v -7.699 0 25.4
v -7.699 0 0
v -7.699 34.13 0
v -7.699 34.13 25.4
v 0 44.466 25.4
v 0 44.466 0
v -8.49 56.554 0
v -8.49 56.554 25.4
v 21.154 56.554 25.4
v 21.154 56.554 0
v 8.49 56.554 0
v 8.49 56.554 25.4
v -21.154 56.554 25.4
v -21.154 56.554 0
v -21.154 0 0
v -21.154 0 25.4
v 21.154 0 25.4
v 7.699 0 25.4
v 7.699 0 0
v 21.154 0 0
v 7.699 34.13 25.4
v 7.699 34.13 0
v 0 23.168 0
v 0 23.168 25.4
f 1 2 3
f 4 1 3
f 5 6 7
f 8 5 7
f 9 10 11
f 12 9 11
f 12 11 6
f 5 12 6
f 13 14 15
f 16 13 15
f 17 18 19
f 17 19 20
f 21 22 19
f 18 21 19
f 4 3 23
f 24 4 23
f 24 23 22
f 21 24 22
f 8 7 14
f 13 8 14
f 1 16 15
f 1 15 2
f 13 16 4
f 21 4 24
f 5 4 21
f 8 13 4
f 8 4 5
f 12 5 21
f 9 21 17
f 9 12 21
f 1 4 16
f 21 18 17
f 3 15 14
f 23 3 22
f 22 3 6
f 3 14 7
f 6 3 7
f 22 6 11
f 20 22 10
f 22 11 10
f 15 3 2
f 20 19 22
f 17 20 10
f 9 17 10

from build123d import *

# Parameters (mm, degrees)
F0_W          = 29.8302113987
F0_H          = 9.2097856104
F1_DEPTH      = 25.4
F2_T1_DEPTH   = 25.4
F2_T3_DEPTH   = 15.24
F2_T5_DEPTH   = 56.4671399768
F2_T7_DEPTH   = 44.9504289544
F2_T9_DEPTH   = 56.4670330548
F2_T11_DEPTH  = 20.32
F2_T13_DEPTH  = 20.3101045111
F2_T15_DEPTH  = 50.8
F2_T20_DEPTH  = 5.08
F2_T26_DEPTH  = 5.08
F2_T32_DEPTH  = 5.08
F2_T38_DEPTH  = 5.08
F2_S43_W      = 5.08
F2_S43_H      = 5.08
F2_T44_DEPTH  = 5.08
F2_S49_W      = 5.08
F2_S49_H      = 5.08
F2_T50_DEPTH  = 5.08
F2_S55_W      = 5.08
F2_S55_H      = 5.08
F2_T56_DEPTH  = 5.08
F2_S61_W      = 5.08
F2_S61_H      = 5.08
F2_T62_DEPTH  = 5.08
F2_T65_DEPTH  = 11.1376243347
F2_T67_DEPTH  = 11.5693333262
F2_T69_DEPTH  = 19.6702113987
F2_S73_W      = 5.08
F2_S73_H      = 5.08
F2_T74_DEPTH  = 5.08
F2_S79_W      = 5.08
F2_S79_H      = 5.08
F2_T80_DEPTH  = 5.08
F2_S85_W      = 5.08
F2_S85_H      = 5.08
F2_T86_DEPTH  = 5.08
F2_S91_W      = 5.08
F2_S91_H      = 5.08
F2_T92_DEPTH  = 5.08
F2_T96_ANGLE  = 90
F2_T98_ANGLE  = 90
F2_T100_ANGLE = 90
F2_T102_ANGLE = 90
F2_T104_ANGLE = 90
F2_T106_ANGLE = 90
F2_T108_ANGLE = 90
F2_T110_ANGLE = 90
F2_T112_ANGLE = 90
F2_T114_ANGLE = 90
F2_T116_ANGLE = 90
F2_T118_ANGLE = 90
F3_DEPTH      = 25.4
F6_DEPTH      = 25.4


# Not quite as in the source:
# - a fillet or chamfer that OpenCascade refuses, or shapes differently, is made with other operations: its cross-section is extruded or revolved along the edge and cut away or added


with BuildPart() as f1:
    # F0 (on Top) → F1 (new body)
    with BuildSketch(Plane.XY):
        Polygon((-27.6151056993, 52.1290511863), (-27.6151056993, 0), (-14.9151056993, 0), (-14.9151056993, 21.7293333262), (-14.9151056993, 30.9391189367), (-14.9151056993, 52.2367432714), (14.9151056993, 52.2367432714), (14.9151056993, 30.9391189367), (14.9151056993, 21.7293333262), (14.9151056993, 0), (27.6151056993, 0), (27.4854470044, 66.6270330548), (-27.6151056993, 66.6270330548), align=None)
        with Locations((0, 26.3342261314)):
            Rectangle(F0_W, F0_H)
    extrude(amount=F1_DEPTH)

    # F2: fillet of radius 5.08 on 36 edges, made by hand

    # F2_s2 → F2_t1 (join)
    with BuildSketch(Plane.XY):
        with BuildLine():
            ThreePointArc((-14.9151056993, 36.0191189367), (-13.4272081478, 32.4270164882), (-9.8351056993, 30.9391189367))
            Line((-9.8351056993, 30.9391189367), (-14.9151056993, 30.9391189367))
            Line((-14.9151056993, 30.9391189367), (-14.9151056993, 36.0191189367))
        make_face()
        with BuildLine():
            ThreePointArc((-14.9151056993, 47.1567432714), (-13.4272081478, 50.7488457198), (-9.8351056993, 52.2367432714))
            Line((-9.8351056993, 52.2367432714), (-14.9151056993, 52.2367432714))
            Line((-14.9151056993, 52.2367432714), (-14.9151056993, 47.1567432714))
        make_face()
        with BuildLine():
            ThreePointArc((9.8351056993, 52.2367432714), (13.4272081478, 50.7488457198), (14.9151056993, 47.1567432714))
            Line((14.9151056993, 47.1567432714), (14.9151056993, 52.2367432714))
            Line((14.9151056993, 52.2367432714), (9.8351056993, 52.2367432714))
        make_face()
        with BuildLine():
            ThreePointArc((14.9151056993, 36.0191189367), (13.4272081478, 32.4270164882), (9.8351056993, 30.9391189367))
            Line((9.8351056993, 30.9391189367), (14.9151056993, 30.9391189367))
            Line((14.9151056993, 30.9391189367), (14.9151056993, 36.0191189367))
        make_face()
        with BuildLine():
            ThreePointArc((9.8351056993, 21.7293333262), (13.4272081478, 20.2414357746), (14.9151056993, 16.6493333262))
            Line((14.9151056993, 16.6493333262), (14.9151056993, 21.7293333262))
            Line((14.9151056993, 21.7293333262), (9.8351056993, 21.7293333262))
        make_face()
        with BuildLine():
            ThreePointArc((-14.9151056993, 16.6493333262), (-13.4272081478, 20.2414357746), (-9.8351056993, 21.7293333262))
            Line((-9.8351056993, 21.7293333262), (-14.9151056993, 21.7293333262))
            Line((-14.9151056993, 21.7293333262), (-14.9151056993, 16.6493333262))
        make_face()
    extrude(amount=F2_T1_DEPTH)

    # F2_s4 → F2_t3 (cut)
    with BuildSketch(Plane.XY.offset(5.08)):
        with BuildLine():
            ThreePointArc((27.6052005914, 5.089885851), (26.1208061363, 1.4913944298), (22.5252102105, 0))
            Line((22.5252102105, 0), (27.6151056993, 0))
            Line((27.6151056993, 0), (27.6052005914, 5.089885851))
        make_face()
        with BuildLine():
            ThreePointArc((22.4153232551, 66.6270330548), (26.0039288252, 65.1426289806), (27.4953136359, 61.5569189059))
            Line((27.4953136359, 61.5569189059), (27.4854470044, 66.6270330548))
            Line((27.4854470044, 66.6270330548), (22.4153232551, 66.6270330548))
        make_face()
        with BuildLine():
            ThreePointArc((-22.5351056993, 66.6270330548), (-26.1272081478, 65.1391355033), (-27.6151056993, 61.5470330548))
            Line((-27.6151056993, 61.5470330548), (-27.6151056993, 66.6270330548))
            Line((-27.6151056993, 66.6270330548), (-22.5351056993, 66.6270330548))
        make_face()
        with BuildLine():
            ThreePointArc((-27.6151056993, 5.08), (-26.1272081478, 1.4878975516), (-22.5351056993, 0))
            Line((-22.5351056993, 0), (-27.6151056993, 0))
            Line((-27.6151056993, 0), (-27.6151056993, 5.08))
        make_face()
    extrude(amount=F2_T3_DEPTH, mode=Mode.SUBTRACT)

    # F2_s6 → F2_t5 (cut)
    with BuildSketch(Plane(origin=(-0.0098005283, 5.0361460274, 0), x_dir=(0, 0, 1), z_dir=(-0.0019460337, 0.9999981065, 0))):
        with BuildLine():
            ThreePointArc((5.08, 27.6150534094), (1.4878975516, 26.1271558579), (0, 22.5350534094))
            Line((0, 22.5350534094), (0, 27.6150534094))
            Line((0, 27.6150534094), (5.08, 27.6150534094))
        make_face()
        with BuildLine():
            ThreePointArc((20.32, 27.6150534094), (23.9121024484, 26.1271558579), (25.4, 22.5350534094))
            Line((25.4, 22.5350534094), (25.4, 27.6150534094))
            Line((25.4, 27.6150534094), (20.32, 27.6150534094))
        make_face()
    extrude(amount=F2_T5_DEPTH, mode=Mode.SUBTRACT)

    # F2_s8 → F2_t7 (cut)
    with BuildSketch(Plane.YZ.offset(-22.5351056993)):
        with BuildLine():
            ThreePointArc((66.6270330548, 5.08), (65.1391355033, 1.4878975516), (61.5470330548, 0))
            Line((61.5470330548, 0), (66.6270330548, 0))
            Line((66.6270330548, 0), (66.6270330548, 5.08))
        make_face()
        with BuildLine():
            ThreePointArc((66.6270330548, 20.32), (65.1391355033, 23.9121024484), (61.5470330548, 25.4))
            Line((61.5470330548, 25.4), (66.6270330548, 25.4))
            Line((66.6270330548, 25.4), (66.6270330548, 20.32))
        make_face()
    extrude(amount=F2_T7_DEPTH, mode=Mode.SUBTRACT)

    # F2_s10 → F2_t9 (cut)
    with BuildSketch(Plane.XZ.offset(-61.5470330548)):
        with BuildLine():
            ThreePointArc((-27.6151056993, 20.32), (-26.1272081478, 23.9121024484), (-22.5351056993, 25.4))
            Line((-22.5351056993, 25.4), (-27.6151056993, 25.4))
            Line((-27.6151056993, 25.4), (-27.6151056993, 20.32))
        make_face()
        with BuildLine():
            ThreePointArc((-27.6151056993, 5.08), (-26.1272081478, 1.4878975516), (-22.5351056993, 0))
            Line((-22.5351056993, 0), (-27.6151056993, 0))
            Line((-27.6151056993, 0), (-27.6151056993, 5.08))
        make_face()
    extrude(amount=F2_T9_DEPTH, mode=Mode.SUBTRACT)

    # F2_s12 → F2_t11 (cut)
    with BuildSketch(Plane.YZ.offset(-22.5351056993)):
        with BuildLine():
            ThreePointArc((5.08, 25.4), (1.4878975516, 23.9121024484), (0, 20.32))
            Line((0, 20.32), (0, 25.4))
            Line((0, 25.4), (5.08, 25.4))
        make_face()
        with BuildLine():
            ThreePointArc((5.08, 0), (1.4878975516, 1.4878975516), (0, 5.08))
            Line((0, 5.08), (0, 0))
            Line((0, 0), (5.08, 0))
        make_face()
    extrude(amount=F2_T11_DEPTH, mode=Mode.SUBTRACT)

    # F2_s14 → F2_t13 (cut)
    with BuildSketch(Plane.YZ.offset(2.2151056993)):
        with BuildLine():
            ThreePointArc((5.08, 25.4), (1.4878975516, 23.9121024484), (0, 20.32))
            Line((0, 20.32), (0, 25.4))
            Line((0, 25.4), (5.08, 25.4))
        make_face()
        with BuildLine():
            ThreePointArc((5.08, 0), (1.4878975516, 1.4878975516), (0, 5.08))
            Line((0, 5.08), (0, 0))
            Line((0, 0), (5.08, 0))
        make_face()
    extrude(amount=F2_T13_DEPTH, mode=Mode.SUBTRACT)

    # F2_s16 → F2_t15 (cut)
    with BuildSketch(Plane.XY.offset(-12.7)):
        with BuildLine():
            ThreePointArc((19.9951056993, 0), (16.4030032509, 1.4878975516), (14.9151056993, 5.08))
            Line((14.9151056993, 5.08), (14.9151056993, 0))
            Line((14.9151056993, 0), (19.9951056993, 0))
        make_face()
        with BuildLine():
            ThreePointArc((-19.9951056993, 0), (-16.4030032509, 1.4878975516), (-14.9151056993, 5.08))
            Line((-14.9151056993, 5.08), (-14.9151056993, 0))
            Line((-14.9151056993, 0), (-19.9951056993, 0))
        make_face()
    extrude(amount=F2_T15_DEPTH, mode=Mode.SUBTRACT)


with BuildPart() as f2_tool18:
    # F2_s19 → F2_t20 (new body)
    with BuildSketch(Plane.XY.offset(5.08)):
        Polygon((22.5252102105, 5.08), (22.5252102105, 0), (27.6151056993, 0), (27.6052005914, 5.089885851), align=None)
    extrude(amount=-F2_T20_DEPTH)

    # F2_s21 → F2_t22 (revolve, cut)
    with BuildSketch(Plane(origin=(22.5252102105, 5.08, 5.08), x_dir=(-0.7077944736, 0.7064184193, 0), z_dir=(-0.7064184193, -0.7077944736, 0))):
        with BuildLine():
            ThreePointArc((0, -5.08), (5.08, 0), (0, 5.08))
            Line((0, 5.08), (0, -5.08))
        make_face()
    revolve(axis=Axis((22.5252102105, 5.08, 5.08), (0, 0, -1)), mode=Mode.SUBTRACT)


with BuildPart() as f1_1:
    add(f1.part)

    # F2_t17: cut F2_tool18
    add(f2_tool18.part, mode=Mode.SUBTRACT)


with BuildPart() as f2_tool24:
    # F2_s25 → F2_t26 (new body)
    with BuildSketch(Plane.XY.offset(20.32)):
        Polygon((22.5252102105, 5.08), (22.5252102105, 0), (27.6151056993, 0), (27.6052005914, 5.089885851), align=None)
    extrude(amount=F2_T26_DEPTH)

    # F2_s27 → F2_t28 (revolve, cut)
    with BuildSketch(Plane(origin=(22.5252102105, 5.08, 20.32), x_dir=(-0.7077944736, 0.7064184193, 0), z_dir=(0.7064184193, 0.7077944736, 0))):
        with BuildLine():
            ThreePointArc((0, -5.08), (5.08, 0), (0, 5.08))
            Line((0, 5.08), (0, -5.08))
        make_face()
    revolve(axis=Axis((22.5252102105, 5.08, 20.32), (0, 0, 1)), mode=Mode.SUBTRACT)


with BuildPart() as f1_2:
    add(f1_1.part)

    # F2_t23: cut F2_tool24
    add(f2_tool24.part, mode=Mode.SUBTRACT)


with BuildPart() as f2_tool30:
    # F2_s31 → F2_t32 (new body)
    with BuildSketch(Plane.XY.offset(5.08)):
        Polygon((22.4153232551, 61.5470330548), (22.4153232551, 66.6270330548), (27.4854470044, 66.6270330548), (27.4953136359, 61.5569189059), align=None)
    extrude(amount=-F2_T32_DEPTH)

    # F2_s33 → F2_t34 (revolve, cut)
    with BuildSketch(Plane(origin=(22.4153232551, 61.5470330548, 5.08), x_dir=(-0.7064184193, -0.7077944736, 0), z_dir=(0.7077944736, -0.7064184193, 0))):
        with BuildLine():
            ThreePointArc((0, -5.08), (5.08, 0), (0, 5.08))
            Line((0, 5.08), (0, -5.08))
        make_face()
    revolve(axis=Axis((22.4153232551, 61.5470330548, 5.08), (0, 0, -1)), mode=Mode.SUBTRACT)


with BuildPart() as f1_3:
    add(f1_2.part)

    # F2_t29: cut F2_tool30
    add(f2_tool30.part, mode=Mode.SUBTRACT)


with BuildPart() as f2_tool36:
    # F2_s37 → F2_t38 (new body)
    with BuildSketch(Plane.XY.offset(20.32)):
        Polygon((22.4153232551, 61.5470330548), (22.4153232551, 66.6270330548), (27.4854470044, 66.6270330548), (27.4953136359, 61.5569189059), align=None)
    extrude(amount=F2_T38_DEPTH)

    # F2_s39 → F2_t40 (revolve, cut)
    with BuildSketch(Plane(origin=(22.4153232551, 61.5470330548, 20.32), x_dir=(-0.7064184193, -0.7077944736, 0), z_dir=(-0.7077944736, 0.7064184193, 0))):
        with BuildLine():
            ThreePointArc((0, -5.08), (5.08, 0), (0, 5.08))
            Line((0, 5.08), (0, -5.08))
        make_face()
    revolve(axis=Axis((22.4153232551, 61.5470330548, 20.32), (0, 0, 1)), mode=Mode.SUBTRACT)


with BuildPart() as f1_4:
    add(f1_3.part)

    # F2_t35: cut F2_tool36
    add(f2_tool36.part, mode=Mode.SUBTRACT)


with BuildPart() as f2_tool42:
    # F2_s43 → F2_t44 (new body)
    with BuildSketch(Plane.XZ.offset(-61.5470330548)):
        with Locations((-25.0751056993, 2.54)):
            Rectangle(F2_S43_W, F2_S43_H)
    extrude(amount=-F2_T44_DEPTH)

    # F2_s45 → F2_t46 (revolve, cut)
    with BuildSketch(Plane(origin=(-22.5351056993, 61.5470330548, 5.08), x_dir=(0.7071067812, 0, 0.7071067812), z_dir=(-0.7071067812, 0, 0.7071067812))):
        with BuildLine():
            ThreePointArc((0, -5.08), (5.08, 0), (0, 5.08))
            Line((0, 5.08), (0, -5.08))
        make_face()
    revolve(axis=Axis((-22.5351056993, 61.5470330548, 5.08), (0, 1, 0)), mode=Mode.SUBTRACT)


with BuildPart() as f1_5:
    add(f1_4.part)

    # F2_t41: cut F2_tool42
    add(f2_tool42.part, mode=Mode.SUBTRACT)


with BuildPart() as f2_tool48:
    # F2_s49 → F2_t50 (new body)
    with BuildSketch(Plane.XZ.offset(-61.5470330548)):
        with Locations((-25.0751056993, 22.86)):
            Rectangle(F2_S49_W, F2_S49_H)
    extrude(amount=-F2_T50_DEPTH)

    # F2_s51 → F2_t52 (revolve, cut)
    with BuildSketch(Plane(origin=(-22.5351056993, 61.5470330548, 20.32), x_dir=(0.7071067812, 0, -0.7071067812), z_dir=(0.7071067812, 0, 0.7071067812))):
        with BuildLine():
            ThreePointArc((0, -5.08), (5.08, 0), (0, 5.08))
            Line((0, 5.08), (0, -5.08))
        make_face()
    revolve(axis=Axis((-22.5351056993, 61.5470330548, 20.32), (0, 1, 0)), mode=Mode.SUBTRACT)


with BuildPart() as f1_6:
    add(f1_5.part)

    # F2_t47: cut F2_tool48
    add(f2_tool48.part, mode=Mode.SUBTRACT)


with BuildPart() as f2_tool54:
    # F2_s55 → F2_t56 (new body)
    with BuildSketch(Plane.YZ.offset(-22.5351056993)):
        with Locations((2.54, 22.86)):
            Rectangle(F2_S55_W, F2_S55_H)
    extrude(amount=-F2_T56_DEPTH)

    # F2_s57 → F2_t58 (revolve, cut)
    with BuildSketch(Plane(origin=(-22.5351056993, 5.08, 20.32), x_dir=(0, 0.7071067812, -0.7071067812), z_dir=(0, 0.7071067812, 0.7071067812))):
        with BuildLine():
            ThreePointArc((0, -5.08), (5.08, 0), (0, 5.08))
            Line((0, 5.08), (0, -5.08))
        make_face()
    revolve(axis=Axis((-22.5351056993, 5.08, 20.32), (-1, 0, 0)), mode=Mode.SUBTRACT)


with BuildPart() as f1_7:
    add(f1_6.part)

    # F2_t53: cut F2_tool54
    add(f2_tool54.part, mode=Mode.SUBTRACT)


with BuildPart() as f2_tool60:
    # F2_s61 → F2_t62 (new body)
    with BuildSketch(Plane.YZ.offset(-22.5351056993)):
        with Locations((2.54, 2.54)):
            Rectangle(F2_S61_W, F2_S61_H)
    extrude(amount=-F2_T62_DEPTH)

    # F2_s63 → F2_t64 (revolve, cut)
    with BuildSketch(Plane(origin=(-22.5351056993, 5.08, 5.08), x_dir=(0, 0.7071067812, 0.7071067812), z_dir=(0, -0.7071067812, 0.7071067812))):
        with BuildLine():
            ThreePointArc((0, -5.08), (5.08, 0), (0, 5.08))
            Line((0, 5.08), (0, -5.08))
        make_face()
    revolve(axis=Axis((-22.5351056993, 5.08, 5.08), (-1, 0, 0)), mode=Mode.SUBTRACT)


with BuildPart() as f1_8:
    add(f1_7.part)

    # F2_t59: cut F2_tool60
    add(f2_tool60.part, mode=Mode.SUBTRACT)

    # F2_s66 → F2_t65 (cut)
    with BuildSketch(Plane.XZ.offset(-47.1567432714)):
        with BuildLine():
            ThreePointArc((-19.9951056993, 0), (-16.4030032509, 1.4878975516), (-14.9151056993, 5.08))
            Line((-14.9151056993, 5.08), (-14.9151056993, 0))
            Line((-14.9151056993, 0), (-19.9951056993, 0))
        make_face()
        with BuildLine():
            ThreePointArc((-19.9951056993, 25.4), (-16.4030032509, 23.9121024484), (-14.9151056993, 20.32))
            Line((-14.9151056993, 20.32), (-14.9151056993, 25.4))
            Line((-14.9151056993, 25.4), (-19.9951056993, 25.4))
        make_face()
        with BuildLine():
            ThreePointArc((19.9951056993, 25.4), (16.4030032509, 23.9121024484), (14.9151056993, 20.32))
            Line((14.9151056993, 20.32), (14.9151056993, 25.4))
            Line((14.9151056993, 25.4), (19.9951056993, 25.4))
        make_face()
        with BuildLine():
            ThreePointArc((19.9951056993, 0), (16.4030032509, 1.4878975516), (14.9151056993, 5.08))
            Line((14.9151056993, 5.08), (14.9151056993, 0))
            Line((14.9151056993, 0), (19.9951056993, 0))
        make_face()
    extrude(amount=F2_T65_DEPTH, mode=Mode.SUBTRACT)

    # F2_s68 → F2_t67 (cut)
    with BuildSketch(Plane.XZ.offset(-16.6493333262)):
        with BuildLine():
            ThreePointArc((-19.9951056993, 25.4), (-16.4030032509, 23.9121024484), (-14.9151056993, 20.32))
            Line((-14.9151056993, 20.32), (-14.9151056993, 25.4))
            Line((-14.9151056993, 25.4), (-19.9951056993, 25.4))
        make_face()
        with BuildLine():
            ThreePointArc((19.9951056993, 25.4), (16.4030032509, 23.9121024484), (14.9151056993, 20.32))
            Line((14.9151056993, 20.32), (14.9151056993, 25.4))
            Line((14.9151056993, 25.4), (19.9951056993, 25.4))
        make_face()
        with BuildLine():
            ThreePointArc((19.9951056993, 0), (16.4030032509, 1.4878975516), (14.9151056993, 5.08))
            Line((14.9151056993, 5.08), (14.9151056993, 0))
            Line((14.9151056993, 0), (19.9951056993, 0))
        make_face()
        with BuildLine():
            ThreePointArc((-19.9951056993, 0), (-16.4030032509, 1.4878975516), (-14.9151056993, 5.08))
            Line((-14.9151056993, 5.08), (-14.9151056993, 0))
            Line((-14.9151056993, 0), (-19.9951056993, 0))
        make_face()
    extrude(amount=F2_T67_DEPTH, mode=Mode.SUBTRACT)

    # F2_s70 → F2_t69 (cut)
    with BuildSketch(Plane.YZ.offset(-9.8351056993)):
        with BuildLine():
            ThreePointArc((26.8093333262, 25.4), (23.2172308778, 23.9121024484), (21.7293333262, 20.32))
            Line((21.7293333262, 20.32), (21.7293333262, 25.4))
            Line((21.7293333262, 25.4), (26.8093333262, 25.4))
        make_face()
        with BuildLine():
            ThreePointArc((57.3167432714, 25.4), (53.7246408229, 23.9121024484), (52.2367432714, 20.32))
            Line((52.2367432714, 20.32), (52.2367432714, 25.4))
            Line((52.2367432714, 25.4), (57.3167432714, 25.4))
        make_face()
        with BuildLine():
            ThreePointArc((25.8591189367, 25.4), (29.4512213851, 23.9121024484), (30.9391189367, 20.32))
            Line((30.9391189367, 20.32), (30.9391189367, 25.4))
            Line((30.9391189367, 25.4), (25.8591189367, 25.4))
        make_face()
        with BuildLine():
            ThreePointArc((26.8093333262, 0), (23.2172308778, 1.4878975516), (21.7293333262, 5.08))
            Line((21.7293333262, 5.08), (21.7293333262, 0))
            Line((21.7293333262, 0), (26.8093333262, 0))
        make_face()
        with BuildLine():
            ThreePointArc((57.3167432714, 0), (53.7246408229, 1.4878975516), (52.2367432714, 5.08))
            Line((52.2367432714, 5.08), (52.2367432714, 0))
            Line((52.2367432714, 0), (57.3167432714, 0))
        make_face()
        with BuildLine():
            ThreePointArc((25.8591189367, 0), (29.4512213851, 1.4878975516), (30.9391189367, 5.08))
            Line((30.9391189367, 5.08), (30.9391189367, 0))
            Line((30.9391189367, 0), (25.8591189367, 0))
        make_face()
    extrude(amount=F2_T69_DEPTH, mode=Mode.SUBTRACT)


with BuildPart() as f2_tool72:
    # F2_s73 → F2_t74 (new body)
    with BuildSketch(Plane.XY.offset(5.08)):
        with Locations((-17.4551056993, 2.54)):
            Rectangle(F2_S73_W, F2_S73_H)
    extrude(amount=-F2_T74_DEPTH)

    # F2_s75 → F2_t76 (revolve, cut)
    with BuildSketch(Plane(origin=(-19.9951056993, 5.08, 5.08), x_dir=(-0.7071067812, 0.7071067812, 0), z_dir=(-0.7071067812, -0.7071067812, 0))):
        with BuildLine():
            ThreePointArc((0, -5.08), (5.08, 0), (0, 5.08))
            Line((0, 5.08), (0, -5.08))
        make_face()
    revolve(axis=Axis((-19.9951056993, 5.08, 5.08), (0, 0, -1)), mode=Mode.SUBTRACT)


with BuildPart() as f1_9:
    add(f1_8.part)

    # F2_t71: cut F2_tool72
    add(f2_tool72.part, mode=Mode.SUBTRACT)


with BuildPart() as f2_tool78:
    # F2_s79 → F2_t80 (new body)
    with BuildSketch(Plane.XY.offset(5.08)):
        with Locations((17.4551056993, 2.54)):
            Rectangle(F2_S79_W, F2_S79_H)
    extrude(amount=-F2_T80_DEPTH)

    # F2_s81 → F2_t82 (revolve, cut)
    with BuildSketch(Plane(origin=(19.9951056993, 5.08, 5.08), x_dir=(0.7071067812, 0.7071067812, 0), z_dir=(-0.7071067812, 0.7071067812, 0))):
        with BuildLine():
            ThreePointArc((0, -5.08), (5.08, 0), (0, 5.08))
            Line((0, 5.08), (0, -5.08))
        make_face()
    revolve(axis=Axis((19.9951056993, 5.08, 5.08), (0, 0, -1)), mode=Mode.SUBTRACT)


with BuildPart() as f1_10:
    add(f1_9.part)

    # F2_t77: cut F2_tool78
    add(f2_tool78.part, mode=Mode.SUBTRACT)


with BuildPart() as f2_tool84:
    # F2_s85 → F2_t86 (new body)
    with BuildSketch(Plane.XY.offset(20.32)):
        with Locations((17.4551056993, 2.54)):
            Rectangle(F2_S85_W, F2_S85_H)
    extrude(amount=F2_T86_DEPTH)

    # F2_s87 → F2_t88 (revolve, cut)
    with BuildSketch(Plane(origin=(19.9951056993, 5.08, 20.32), x_dir=(0.7071067812, 0.7071067812, 0), z_dir=(0.7071067812, -0.7071067812, 0))):
        with BuildLine():
            ThreePointArc((0, -5.08), (5.08, 0), (0, 5.08))
            Line((0, 5.08), (0, -5.08))
        make_face()
    revolve(axis=Axis((19.9951056993, 5.08, 20.32), (0, 0, 1)), mode=Mode.SUBTRACT)


with BuildPart() as f1_11:
    add(f1_10.part)

    # F2_t83: cut F2_tool84
    add(f2_tool84.part, mode=Mode.SUBTRACT)


with BuildPart() as f2_tool90:
    # F2_s91 → F2_t92 (new body)
    with BuildSketch(Plane.XY.offset(20.32)):
        with Locations((-17.4551056993, 2.54)):
            Rectangle(F2_S91_W, F2_S91_H)
    extrude(amount=F2_T92_DEPTH)

    # F2_s93 → F2_t94 (revolve, cut)
    with BuildSketch(Plane(origin=(-19.9951056993, 5.08, 20.32), x_dir=(-0.7071067812, 0.7071067812, 0), z_dir=(0.7071067812, 0.7071067812, 0))):
        with BuildLine():
            ThreePointArc((0, -5.08), (5.08, 0), (0, 5.08))
            Line((0, 5.08), (0, -5.08))
        make_face()
    revolve(axis=Axis((-19.9951056993, 5.08, 20.32), (0, 0, 1)), mode=Mode.SUBTRACT)


with BuildPart() as f1_12:
    add(f1_11.part)

    # F2_t89: cut F2_tool90
    add(f2_tool90.part, mode=Mode.SUBTRACT)

    # F2_s95 → F2_t96 (revolve, cut)
    with BuildSketch(Plane.XZ.offset(-36.0191189367)):
        with BuildLine():
            ThreePointArc((19.9951056993, 0), (16.4030032509, 1.4878975516), (14.9151056993, 5.08))
            Line((14.9151056993, 5.08), (14.9151056993, 0))
            Line((14.9151056993, 0), (19.9951056993, 0))
        make_face()
    revolve(axis=Axis((9.8351056993, 36.0191189367, 0), (0, 0, -1)), revolution_arc=F2_T96_ANGLE, mode=Mode.SUBTRACT)

    # F2_s97 → F2_t98 (revolve, cut)
    with BuildSketch(Plane.XZ.offset(-36.0191189367)):
        with BuildLine():
            ThreePointArc((-19.9951056993, 0), (-16.4030032509, 1.4878975516), (-14.9151056993, 5.08))
            Line((-14.9151056993, 5.08), (-14.9151056993, 0))
            Line((-14.9151056993, 0), (-19.9951056993, 0))
        make_face()
    revolve(axis=Axis((-9.8351056993, 36.0191189367, 0), (0, 0, 1)), revolution_arc=F2_T98_ANGLE, mode=Mode.SUBTRACT)

    # F2_s99 → F2_t100 (revolve, cut)
    with BuildSketch(Plane.XZ.offset(-47.1567432714)):
        with BuildLine():
            ThreePointArc((-19.9951056993, 0), (-16.4030032509, 1.4878975516), (-14.9151056993, 5.08))
            Line((-14.9151056993, 5.08), (-14.9151056993, 0))
            Line((-14.9151056993, 0), (-19.9951056993, 0))
        make_face()
    revolve(axis=Axis((-9.8351056993, 47.1567432714, 0), (0, 0, -1)), revolution_arc=F2_T100_ANGLE, mode=Mode.SUBTRACT)

    # F2_s101 → F2_t102 (revolve, cut)
    with BuildSketch(Plane.YZ.offset(9.8351056993)):
        with BuildLine():
            ThreePointArc((57.3167432714, 0), (53.7246408229, 1.4878975516), (52.2367432714, 5.08))
            Line((52.2367432714, 5.08), (52.2367432714, 0))
            Line((52.2367432714, 0), (57.3167432714, 0))
        make_face()
    revolve(axis=Axis((9.8351056993, 47.1567432714, 0), (0, 0, -1)), revolution_arc=F2_T102_ANGLE, mode=Mode.SUBTRACT)

    # F2_s103 → F2_t104 (revolve, cut)
    with BuildSketch(Plane.XZ.offset(-16.6493333262)):
        with BuildLine():
            ThreePointArc((-19.9951056993, 0), (-16.4030032509, 1.4878975516), (-14.9151056993, 5.08))
            Line((-14.9151056993, 5.08), (-14.9151056993, 0))
            Line((-14.9151056993, 0), (-19.9951056993, 0))
        make_face()
    revolve(axis=Axis((-9.8351056993, 16.6493333262, 0), (0, 0, -1)), revolution_arc=F2_T104_ANGLE, mode=Mode.SUBTRACT)

    # F2_s105 → F2_t106 (revolve, cut)
    with BuildSketch(Plane.YZ.offset(9.8351056993)):
        with BuildLine():
            ThreePointArc((26.8093333262, 0), (23.2172308778, 1.4878975516), (21.7293333262, 5.08))
            Line((21.7293333262, 5.08), (21.7293333262, 0))
            Line((21.7293333262, 0), (26.8093333262, 0))
        make_face()
    revolve(axis=Axis((9.8351056993, 16.6493333262, 0), (0, 0, -1)), revolution_arc=F2_T106_ANGLE, mode=Mode.SUBTRACT)

    # F2_s107 → F2_t108 (revolve, cut)
    with BuildSketch(Plane.XZ.offset(-36.0191189367)):
        with BuildLine():
            ThreePointArc((19.9951056993, 25.4), (16.4030032509, 23.9121024484), (14.9151056993, 20.32))
            Line((14.9151056993, 20.32), (14.9151056993, 25.4))
            Line((14.9151056993, 25.4), (19.9951056993, 25.4))
        make_face()
    revolve(axis=Axis((9.8351056993, 36.0191189367, 25.4), (0, 0, -1)), revolution_arc=F2_T108_ANGLE, mode=Mode.SUBTRACT)

    # F2_s109 → F2_t110 (revolve, cut)
    with BuildSketch(Plane.XZ.offset(-36.0191189367)):
        with BuildLine():
            ThreePointArc((-19.9951056993, 25.4), (-16.4030032509, 23.9121024484), (-14.9151056993, 20.32))
            Line((-14.9151056993, 20.32), (-14.9151056993, 25.4))
            Line((-14.9151056993, 25.4), (-19.9951056993, 25.4))
        make_face()
    revolve(axis=Axis((-9.8351056993, 36.0191189367, 25.4), (0, 0, 1)), revolution_arc=F2_T110_ANGLE, mode=Mode.SUBTRACT)

    # F2_s111 → F2_t112 (revolve, cut)
    with BuildSketch(Plane.YZ.offset(9.8351056993)):
        with BuildLine():
            ThreePointArc((57.3167432714, 25.4), (53.7246408229, 23.9121024484), (52.2367432714, 20.32))
            Line((52.2367432714, 20.32), (52.2367432714, 25.4))
            Line((52.2367432714, 25.4), (57.3167432714, 25.4))
        make_face()
    revolve(axis=Axis((9.8351056993, 47.1567432714, 25.4), (0, 0, -1)), revolution_arc=F2_T112_ANGLE, mode=Mode.SUBTRACT)

    # F2_s113 → F2_t114 (revolve, cut)
    with BuildSketch(Plane.XZ.offset(-47.1567432714)):
        with BuildLine():
            ThreePointArc((-19.9951056993, 25.4), (-16.4030032509, 23.9121024484), (-14.9151056993, 20.32))
            Line((-14.9151056993, 20.32), (-14.9151056993, 25.4))
            Line((-14.9151056993, 25.4), (-19.9951056993, 25.4))
        make_face()
    revolve(axis=Axis((-9.8351056993, 47.1567432714, 25.4), (0, 0, -1)), revolution_arc=F2_T114_ANGLE, mode=Mode.SUBTRACT)

    # F2_s115 → F2_t116 (revolve, cut)
    with BuildSketch(Plane.YZ.offset(9.8351056993)):
        with BuildLine():
            ThreePointArc((26.8093333262, 25.4), (23.2172308778, 23.9121024484), (21.7293333262, 20.32))
            Line((21.7293333262, 20.32), (21.7293333262, 25.4))
            Line((21.7293333262, 25.4), (26.8093333262, 25.4))
        make_face()
    revolve(axis=Axis((9.8351056993, 16.6493333262, 25.4), (0, 0, -1)), revolution_arc=F2_T116_ANGLE, mode=Mode.SUBTRACT)

    # F2_s117 → F2_t118 (revolve, cut)
    with BuildSketch(Plane.XZ.offset(-16.6493333262)):
        with BuildLine():
            ThreePointArc((-19.9951056993, 25.4), (-16.4030032509, 23.9121024484), (-14.9151056993, 20.32))
            Line((-14.9151056993, 20.32), (-14.9151056993, 25.4))
            Line((-14.9151056993, 25.4), (-19.9951056993, 25.4))
        make_face()
    revolve(axis=Axis((-9.8351056993, 16.6493333262, 25.4), (0, 0, -1)), revolution_arc=F2_T118_ANGLE, mode=Mode.SUBTRACT)

    # F3 (add): a face of the model
    f3_faces = [f1_12.faces().sort_by_distance(p)[0] for p in [
        (0, 58.0391668239, 25.4),
    ]]
    extrude(f3_faces, amount=F3_DEPTH)


with BuildPart() as f6:
    # F5 (on Top) → F6 (new body)
    with BuildSketch(Plane.XY):
        Polygon((-8.4902700037, 56.5538331866), (-21.153723821, 56.5538331866), (-21.153723821, 0), (-7.6992294526, 0), (-7.6992294526, 34.1299795523), (0, 23.1683626771), (0, 44.4659888744), align=None)
        Polygon((8.4902700037, 56.5538331866), (0, 44.4659888744), (0, 23.1683626771), (7.6992294526, 34.1299795523), (7.6992294526, 0), (21.153723821, 0), (21.153723821, 56.5538331866), align=None)
    extrude(amount=F6_DEPTH)


solid = f6.part
